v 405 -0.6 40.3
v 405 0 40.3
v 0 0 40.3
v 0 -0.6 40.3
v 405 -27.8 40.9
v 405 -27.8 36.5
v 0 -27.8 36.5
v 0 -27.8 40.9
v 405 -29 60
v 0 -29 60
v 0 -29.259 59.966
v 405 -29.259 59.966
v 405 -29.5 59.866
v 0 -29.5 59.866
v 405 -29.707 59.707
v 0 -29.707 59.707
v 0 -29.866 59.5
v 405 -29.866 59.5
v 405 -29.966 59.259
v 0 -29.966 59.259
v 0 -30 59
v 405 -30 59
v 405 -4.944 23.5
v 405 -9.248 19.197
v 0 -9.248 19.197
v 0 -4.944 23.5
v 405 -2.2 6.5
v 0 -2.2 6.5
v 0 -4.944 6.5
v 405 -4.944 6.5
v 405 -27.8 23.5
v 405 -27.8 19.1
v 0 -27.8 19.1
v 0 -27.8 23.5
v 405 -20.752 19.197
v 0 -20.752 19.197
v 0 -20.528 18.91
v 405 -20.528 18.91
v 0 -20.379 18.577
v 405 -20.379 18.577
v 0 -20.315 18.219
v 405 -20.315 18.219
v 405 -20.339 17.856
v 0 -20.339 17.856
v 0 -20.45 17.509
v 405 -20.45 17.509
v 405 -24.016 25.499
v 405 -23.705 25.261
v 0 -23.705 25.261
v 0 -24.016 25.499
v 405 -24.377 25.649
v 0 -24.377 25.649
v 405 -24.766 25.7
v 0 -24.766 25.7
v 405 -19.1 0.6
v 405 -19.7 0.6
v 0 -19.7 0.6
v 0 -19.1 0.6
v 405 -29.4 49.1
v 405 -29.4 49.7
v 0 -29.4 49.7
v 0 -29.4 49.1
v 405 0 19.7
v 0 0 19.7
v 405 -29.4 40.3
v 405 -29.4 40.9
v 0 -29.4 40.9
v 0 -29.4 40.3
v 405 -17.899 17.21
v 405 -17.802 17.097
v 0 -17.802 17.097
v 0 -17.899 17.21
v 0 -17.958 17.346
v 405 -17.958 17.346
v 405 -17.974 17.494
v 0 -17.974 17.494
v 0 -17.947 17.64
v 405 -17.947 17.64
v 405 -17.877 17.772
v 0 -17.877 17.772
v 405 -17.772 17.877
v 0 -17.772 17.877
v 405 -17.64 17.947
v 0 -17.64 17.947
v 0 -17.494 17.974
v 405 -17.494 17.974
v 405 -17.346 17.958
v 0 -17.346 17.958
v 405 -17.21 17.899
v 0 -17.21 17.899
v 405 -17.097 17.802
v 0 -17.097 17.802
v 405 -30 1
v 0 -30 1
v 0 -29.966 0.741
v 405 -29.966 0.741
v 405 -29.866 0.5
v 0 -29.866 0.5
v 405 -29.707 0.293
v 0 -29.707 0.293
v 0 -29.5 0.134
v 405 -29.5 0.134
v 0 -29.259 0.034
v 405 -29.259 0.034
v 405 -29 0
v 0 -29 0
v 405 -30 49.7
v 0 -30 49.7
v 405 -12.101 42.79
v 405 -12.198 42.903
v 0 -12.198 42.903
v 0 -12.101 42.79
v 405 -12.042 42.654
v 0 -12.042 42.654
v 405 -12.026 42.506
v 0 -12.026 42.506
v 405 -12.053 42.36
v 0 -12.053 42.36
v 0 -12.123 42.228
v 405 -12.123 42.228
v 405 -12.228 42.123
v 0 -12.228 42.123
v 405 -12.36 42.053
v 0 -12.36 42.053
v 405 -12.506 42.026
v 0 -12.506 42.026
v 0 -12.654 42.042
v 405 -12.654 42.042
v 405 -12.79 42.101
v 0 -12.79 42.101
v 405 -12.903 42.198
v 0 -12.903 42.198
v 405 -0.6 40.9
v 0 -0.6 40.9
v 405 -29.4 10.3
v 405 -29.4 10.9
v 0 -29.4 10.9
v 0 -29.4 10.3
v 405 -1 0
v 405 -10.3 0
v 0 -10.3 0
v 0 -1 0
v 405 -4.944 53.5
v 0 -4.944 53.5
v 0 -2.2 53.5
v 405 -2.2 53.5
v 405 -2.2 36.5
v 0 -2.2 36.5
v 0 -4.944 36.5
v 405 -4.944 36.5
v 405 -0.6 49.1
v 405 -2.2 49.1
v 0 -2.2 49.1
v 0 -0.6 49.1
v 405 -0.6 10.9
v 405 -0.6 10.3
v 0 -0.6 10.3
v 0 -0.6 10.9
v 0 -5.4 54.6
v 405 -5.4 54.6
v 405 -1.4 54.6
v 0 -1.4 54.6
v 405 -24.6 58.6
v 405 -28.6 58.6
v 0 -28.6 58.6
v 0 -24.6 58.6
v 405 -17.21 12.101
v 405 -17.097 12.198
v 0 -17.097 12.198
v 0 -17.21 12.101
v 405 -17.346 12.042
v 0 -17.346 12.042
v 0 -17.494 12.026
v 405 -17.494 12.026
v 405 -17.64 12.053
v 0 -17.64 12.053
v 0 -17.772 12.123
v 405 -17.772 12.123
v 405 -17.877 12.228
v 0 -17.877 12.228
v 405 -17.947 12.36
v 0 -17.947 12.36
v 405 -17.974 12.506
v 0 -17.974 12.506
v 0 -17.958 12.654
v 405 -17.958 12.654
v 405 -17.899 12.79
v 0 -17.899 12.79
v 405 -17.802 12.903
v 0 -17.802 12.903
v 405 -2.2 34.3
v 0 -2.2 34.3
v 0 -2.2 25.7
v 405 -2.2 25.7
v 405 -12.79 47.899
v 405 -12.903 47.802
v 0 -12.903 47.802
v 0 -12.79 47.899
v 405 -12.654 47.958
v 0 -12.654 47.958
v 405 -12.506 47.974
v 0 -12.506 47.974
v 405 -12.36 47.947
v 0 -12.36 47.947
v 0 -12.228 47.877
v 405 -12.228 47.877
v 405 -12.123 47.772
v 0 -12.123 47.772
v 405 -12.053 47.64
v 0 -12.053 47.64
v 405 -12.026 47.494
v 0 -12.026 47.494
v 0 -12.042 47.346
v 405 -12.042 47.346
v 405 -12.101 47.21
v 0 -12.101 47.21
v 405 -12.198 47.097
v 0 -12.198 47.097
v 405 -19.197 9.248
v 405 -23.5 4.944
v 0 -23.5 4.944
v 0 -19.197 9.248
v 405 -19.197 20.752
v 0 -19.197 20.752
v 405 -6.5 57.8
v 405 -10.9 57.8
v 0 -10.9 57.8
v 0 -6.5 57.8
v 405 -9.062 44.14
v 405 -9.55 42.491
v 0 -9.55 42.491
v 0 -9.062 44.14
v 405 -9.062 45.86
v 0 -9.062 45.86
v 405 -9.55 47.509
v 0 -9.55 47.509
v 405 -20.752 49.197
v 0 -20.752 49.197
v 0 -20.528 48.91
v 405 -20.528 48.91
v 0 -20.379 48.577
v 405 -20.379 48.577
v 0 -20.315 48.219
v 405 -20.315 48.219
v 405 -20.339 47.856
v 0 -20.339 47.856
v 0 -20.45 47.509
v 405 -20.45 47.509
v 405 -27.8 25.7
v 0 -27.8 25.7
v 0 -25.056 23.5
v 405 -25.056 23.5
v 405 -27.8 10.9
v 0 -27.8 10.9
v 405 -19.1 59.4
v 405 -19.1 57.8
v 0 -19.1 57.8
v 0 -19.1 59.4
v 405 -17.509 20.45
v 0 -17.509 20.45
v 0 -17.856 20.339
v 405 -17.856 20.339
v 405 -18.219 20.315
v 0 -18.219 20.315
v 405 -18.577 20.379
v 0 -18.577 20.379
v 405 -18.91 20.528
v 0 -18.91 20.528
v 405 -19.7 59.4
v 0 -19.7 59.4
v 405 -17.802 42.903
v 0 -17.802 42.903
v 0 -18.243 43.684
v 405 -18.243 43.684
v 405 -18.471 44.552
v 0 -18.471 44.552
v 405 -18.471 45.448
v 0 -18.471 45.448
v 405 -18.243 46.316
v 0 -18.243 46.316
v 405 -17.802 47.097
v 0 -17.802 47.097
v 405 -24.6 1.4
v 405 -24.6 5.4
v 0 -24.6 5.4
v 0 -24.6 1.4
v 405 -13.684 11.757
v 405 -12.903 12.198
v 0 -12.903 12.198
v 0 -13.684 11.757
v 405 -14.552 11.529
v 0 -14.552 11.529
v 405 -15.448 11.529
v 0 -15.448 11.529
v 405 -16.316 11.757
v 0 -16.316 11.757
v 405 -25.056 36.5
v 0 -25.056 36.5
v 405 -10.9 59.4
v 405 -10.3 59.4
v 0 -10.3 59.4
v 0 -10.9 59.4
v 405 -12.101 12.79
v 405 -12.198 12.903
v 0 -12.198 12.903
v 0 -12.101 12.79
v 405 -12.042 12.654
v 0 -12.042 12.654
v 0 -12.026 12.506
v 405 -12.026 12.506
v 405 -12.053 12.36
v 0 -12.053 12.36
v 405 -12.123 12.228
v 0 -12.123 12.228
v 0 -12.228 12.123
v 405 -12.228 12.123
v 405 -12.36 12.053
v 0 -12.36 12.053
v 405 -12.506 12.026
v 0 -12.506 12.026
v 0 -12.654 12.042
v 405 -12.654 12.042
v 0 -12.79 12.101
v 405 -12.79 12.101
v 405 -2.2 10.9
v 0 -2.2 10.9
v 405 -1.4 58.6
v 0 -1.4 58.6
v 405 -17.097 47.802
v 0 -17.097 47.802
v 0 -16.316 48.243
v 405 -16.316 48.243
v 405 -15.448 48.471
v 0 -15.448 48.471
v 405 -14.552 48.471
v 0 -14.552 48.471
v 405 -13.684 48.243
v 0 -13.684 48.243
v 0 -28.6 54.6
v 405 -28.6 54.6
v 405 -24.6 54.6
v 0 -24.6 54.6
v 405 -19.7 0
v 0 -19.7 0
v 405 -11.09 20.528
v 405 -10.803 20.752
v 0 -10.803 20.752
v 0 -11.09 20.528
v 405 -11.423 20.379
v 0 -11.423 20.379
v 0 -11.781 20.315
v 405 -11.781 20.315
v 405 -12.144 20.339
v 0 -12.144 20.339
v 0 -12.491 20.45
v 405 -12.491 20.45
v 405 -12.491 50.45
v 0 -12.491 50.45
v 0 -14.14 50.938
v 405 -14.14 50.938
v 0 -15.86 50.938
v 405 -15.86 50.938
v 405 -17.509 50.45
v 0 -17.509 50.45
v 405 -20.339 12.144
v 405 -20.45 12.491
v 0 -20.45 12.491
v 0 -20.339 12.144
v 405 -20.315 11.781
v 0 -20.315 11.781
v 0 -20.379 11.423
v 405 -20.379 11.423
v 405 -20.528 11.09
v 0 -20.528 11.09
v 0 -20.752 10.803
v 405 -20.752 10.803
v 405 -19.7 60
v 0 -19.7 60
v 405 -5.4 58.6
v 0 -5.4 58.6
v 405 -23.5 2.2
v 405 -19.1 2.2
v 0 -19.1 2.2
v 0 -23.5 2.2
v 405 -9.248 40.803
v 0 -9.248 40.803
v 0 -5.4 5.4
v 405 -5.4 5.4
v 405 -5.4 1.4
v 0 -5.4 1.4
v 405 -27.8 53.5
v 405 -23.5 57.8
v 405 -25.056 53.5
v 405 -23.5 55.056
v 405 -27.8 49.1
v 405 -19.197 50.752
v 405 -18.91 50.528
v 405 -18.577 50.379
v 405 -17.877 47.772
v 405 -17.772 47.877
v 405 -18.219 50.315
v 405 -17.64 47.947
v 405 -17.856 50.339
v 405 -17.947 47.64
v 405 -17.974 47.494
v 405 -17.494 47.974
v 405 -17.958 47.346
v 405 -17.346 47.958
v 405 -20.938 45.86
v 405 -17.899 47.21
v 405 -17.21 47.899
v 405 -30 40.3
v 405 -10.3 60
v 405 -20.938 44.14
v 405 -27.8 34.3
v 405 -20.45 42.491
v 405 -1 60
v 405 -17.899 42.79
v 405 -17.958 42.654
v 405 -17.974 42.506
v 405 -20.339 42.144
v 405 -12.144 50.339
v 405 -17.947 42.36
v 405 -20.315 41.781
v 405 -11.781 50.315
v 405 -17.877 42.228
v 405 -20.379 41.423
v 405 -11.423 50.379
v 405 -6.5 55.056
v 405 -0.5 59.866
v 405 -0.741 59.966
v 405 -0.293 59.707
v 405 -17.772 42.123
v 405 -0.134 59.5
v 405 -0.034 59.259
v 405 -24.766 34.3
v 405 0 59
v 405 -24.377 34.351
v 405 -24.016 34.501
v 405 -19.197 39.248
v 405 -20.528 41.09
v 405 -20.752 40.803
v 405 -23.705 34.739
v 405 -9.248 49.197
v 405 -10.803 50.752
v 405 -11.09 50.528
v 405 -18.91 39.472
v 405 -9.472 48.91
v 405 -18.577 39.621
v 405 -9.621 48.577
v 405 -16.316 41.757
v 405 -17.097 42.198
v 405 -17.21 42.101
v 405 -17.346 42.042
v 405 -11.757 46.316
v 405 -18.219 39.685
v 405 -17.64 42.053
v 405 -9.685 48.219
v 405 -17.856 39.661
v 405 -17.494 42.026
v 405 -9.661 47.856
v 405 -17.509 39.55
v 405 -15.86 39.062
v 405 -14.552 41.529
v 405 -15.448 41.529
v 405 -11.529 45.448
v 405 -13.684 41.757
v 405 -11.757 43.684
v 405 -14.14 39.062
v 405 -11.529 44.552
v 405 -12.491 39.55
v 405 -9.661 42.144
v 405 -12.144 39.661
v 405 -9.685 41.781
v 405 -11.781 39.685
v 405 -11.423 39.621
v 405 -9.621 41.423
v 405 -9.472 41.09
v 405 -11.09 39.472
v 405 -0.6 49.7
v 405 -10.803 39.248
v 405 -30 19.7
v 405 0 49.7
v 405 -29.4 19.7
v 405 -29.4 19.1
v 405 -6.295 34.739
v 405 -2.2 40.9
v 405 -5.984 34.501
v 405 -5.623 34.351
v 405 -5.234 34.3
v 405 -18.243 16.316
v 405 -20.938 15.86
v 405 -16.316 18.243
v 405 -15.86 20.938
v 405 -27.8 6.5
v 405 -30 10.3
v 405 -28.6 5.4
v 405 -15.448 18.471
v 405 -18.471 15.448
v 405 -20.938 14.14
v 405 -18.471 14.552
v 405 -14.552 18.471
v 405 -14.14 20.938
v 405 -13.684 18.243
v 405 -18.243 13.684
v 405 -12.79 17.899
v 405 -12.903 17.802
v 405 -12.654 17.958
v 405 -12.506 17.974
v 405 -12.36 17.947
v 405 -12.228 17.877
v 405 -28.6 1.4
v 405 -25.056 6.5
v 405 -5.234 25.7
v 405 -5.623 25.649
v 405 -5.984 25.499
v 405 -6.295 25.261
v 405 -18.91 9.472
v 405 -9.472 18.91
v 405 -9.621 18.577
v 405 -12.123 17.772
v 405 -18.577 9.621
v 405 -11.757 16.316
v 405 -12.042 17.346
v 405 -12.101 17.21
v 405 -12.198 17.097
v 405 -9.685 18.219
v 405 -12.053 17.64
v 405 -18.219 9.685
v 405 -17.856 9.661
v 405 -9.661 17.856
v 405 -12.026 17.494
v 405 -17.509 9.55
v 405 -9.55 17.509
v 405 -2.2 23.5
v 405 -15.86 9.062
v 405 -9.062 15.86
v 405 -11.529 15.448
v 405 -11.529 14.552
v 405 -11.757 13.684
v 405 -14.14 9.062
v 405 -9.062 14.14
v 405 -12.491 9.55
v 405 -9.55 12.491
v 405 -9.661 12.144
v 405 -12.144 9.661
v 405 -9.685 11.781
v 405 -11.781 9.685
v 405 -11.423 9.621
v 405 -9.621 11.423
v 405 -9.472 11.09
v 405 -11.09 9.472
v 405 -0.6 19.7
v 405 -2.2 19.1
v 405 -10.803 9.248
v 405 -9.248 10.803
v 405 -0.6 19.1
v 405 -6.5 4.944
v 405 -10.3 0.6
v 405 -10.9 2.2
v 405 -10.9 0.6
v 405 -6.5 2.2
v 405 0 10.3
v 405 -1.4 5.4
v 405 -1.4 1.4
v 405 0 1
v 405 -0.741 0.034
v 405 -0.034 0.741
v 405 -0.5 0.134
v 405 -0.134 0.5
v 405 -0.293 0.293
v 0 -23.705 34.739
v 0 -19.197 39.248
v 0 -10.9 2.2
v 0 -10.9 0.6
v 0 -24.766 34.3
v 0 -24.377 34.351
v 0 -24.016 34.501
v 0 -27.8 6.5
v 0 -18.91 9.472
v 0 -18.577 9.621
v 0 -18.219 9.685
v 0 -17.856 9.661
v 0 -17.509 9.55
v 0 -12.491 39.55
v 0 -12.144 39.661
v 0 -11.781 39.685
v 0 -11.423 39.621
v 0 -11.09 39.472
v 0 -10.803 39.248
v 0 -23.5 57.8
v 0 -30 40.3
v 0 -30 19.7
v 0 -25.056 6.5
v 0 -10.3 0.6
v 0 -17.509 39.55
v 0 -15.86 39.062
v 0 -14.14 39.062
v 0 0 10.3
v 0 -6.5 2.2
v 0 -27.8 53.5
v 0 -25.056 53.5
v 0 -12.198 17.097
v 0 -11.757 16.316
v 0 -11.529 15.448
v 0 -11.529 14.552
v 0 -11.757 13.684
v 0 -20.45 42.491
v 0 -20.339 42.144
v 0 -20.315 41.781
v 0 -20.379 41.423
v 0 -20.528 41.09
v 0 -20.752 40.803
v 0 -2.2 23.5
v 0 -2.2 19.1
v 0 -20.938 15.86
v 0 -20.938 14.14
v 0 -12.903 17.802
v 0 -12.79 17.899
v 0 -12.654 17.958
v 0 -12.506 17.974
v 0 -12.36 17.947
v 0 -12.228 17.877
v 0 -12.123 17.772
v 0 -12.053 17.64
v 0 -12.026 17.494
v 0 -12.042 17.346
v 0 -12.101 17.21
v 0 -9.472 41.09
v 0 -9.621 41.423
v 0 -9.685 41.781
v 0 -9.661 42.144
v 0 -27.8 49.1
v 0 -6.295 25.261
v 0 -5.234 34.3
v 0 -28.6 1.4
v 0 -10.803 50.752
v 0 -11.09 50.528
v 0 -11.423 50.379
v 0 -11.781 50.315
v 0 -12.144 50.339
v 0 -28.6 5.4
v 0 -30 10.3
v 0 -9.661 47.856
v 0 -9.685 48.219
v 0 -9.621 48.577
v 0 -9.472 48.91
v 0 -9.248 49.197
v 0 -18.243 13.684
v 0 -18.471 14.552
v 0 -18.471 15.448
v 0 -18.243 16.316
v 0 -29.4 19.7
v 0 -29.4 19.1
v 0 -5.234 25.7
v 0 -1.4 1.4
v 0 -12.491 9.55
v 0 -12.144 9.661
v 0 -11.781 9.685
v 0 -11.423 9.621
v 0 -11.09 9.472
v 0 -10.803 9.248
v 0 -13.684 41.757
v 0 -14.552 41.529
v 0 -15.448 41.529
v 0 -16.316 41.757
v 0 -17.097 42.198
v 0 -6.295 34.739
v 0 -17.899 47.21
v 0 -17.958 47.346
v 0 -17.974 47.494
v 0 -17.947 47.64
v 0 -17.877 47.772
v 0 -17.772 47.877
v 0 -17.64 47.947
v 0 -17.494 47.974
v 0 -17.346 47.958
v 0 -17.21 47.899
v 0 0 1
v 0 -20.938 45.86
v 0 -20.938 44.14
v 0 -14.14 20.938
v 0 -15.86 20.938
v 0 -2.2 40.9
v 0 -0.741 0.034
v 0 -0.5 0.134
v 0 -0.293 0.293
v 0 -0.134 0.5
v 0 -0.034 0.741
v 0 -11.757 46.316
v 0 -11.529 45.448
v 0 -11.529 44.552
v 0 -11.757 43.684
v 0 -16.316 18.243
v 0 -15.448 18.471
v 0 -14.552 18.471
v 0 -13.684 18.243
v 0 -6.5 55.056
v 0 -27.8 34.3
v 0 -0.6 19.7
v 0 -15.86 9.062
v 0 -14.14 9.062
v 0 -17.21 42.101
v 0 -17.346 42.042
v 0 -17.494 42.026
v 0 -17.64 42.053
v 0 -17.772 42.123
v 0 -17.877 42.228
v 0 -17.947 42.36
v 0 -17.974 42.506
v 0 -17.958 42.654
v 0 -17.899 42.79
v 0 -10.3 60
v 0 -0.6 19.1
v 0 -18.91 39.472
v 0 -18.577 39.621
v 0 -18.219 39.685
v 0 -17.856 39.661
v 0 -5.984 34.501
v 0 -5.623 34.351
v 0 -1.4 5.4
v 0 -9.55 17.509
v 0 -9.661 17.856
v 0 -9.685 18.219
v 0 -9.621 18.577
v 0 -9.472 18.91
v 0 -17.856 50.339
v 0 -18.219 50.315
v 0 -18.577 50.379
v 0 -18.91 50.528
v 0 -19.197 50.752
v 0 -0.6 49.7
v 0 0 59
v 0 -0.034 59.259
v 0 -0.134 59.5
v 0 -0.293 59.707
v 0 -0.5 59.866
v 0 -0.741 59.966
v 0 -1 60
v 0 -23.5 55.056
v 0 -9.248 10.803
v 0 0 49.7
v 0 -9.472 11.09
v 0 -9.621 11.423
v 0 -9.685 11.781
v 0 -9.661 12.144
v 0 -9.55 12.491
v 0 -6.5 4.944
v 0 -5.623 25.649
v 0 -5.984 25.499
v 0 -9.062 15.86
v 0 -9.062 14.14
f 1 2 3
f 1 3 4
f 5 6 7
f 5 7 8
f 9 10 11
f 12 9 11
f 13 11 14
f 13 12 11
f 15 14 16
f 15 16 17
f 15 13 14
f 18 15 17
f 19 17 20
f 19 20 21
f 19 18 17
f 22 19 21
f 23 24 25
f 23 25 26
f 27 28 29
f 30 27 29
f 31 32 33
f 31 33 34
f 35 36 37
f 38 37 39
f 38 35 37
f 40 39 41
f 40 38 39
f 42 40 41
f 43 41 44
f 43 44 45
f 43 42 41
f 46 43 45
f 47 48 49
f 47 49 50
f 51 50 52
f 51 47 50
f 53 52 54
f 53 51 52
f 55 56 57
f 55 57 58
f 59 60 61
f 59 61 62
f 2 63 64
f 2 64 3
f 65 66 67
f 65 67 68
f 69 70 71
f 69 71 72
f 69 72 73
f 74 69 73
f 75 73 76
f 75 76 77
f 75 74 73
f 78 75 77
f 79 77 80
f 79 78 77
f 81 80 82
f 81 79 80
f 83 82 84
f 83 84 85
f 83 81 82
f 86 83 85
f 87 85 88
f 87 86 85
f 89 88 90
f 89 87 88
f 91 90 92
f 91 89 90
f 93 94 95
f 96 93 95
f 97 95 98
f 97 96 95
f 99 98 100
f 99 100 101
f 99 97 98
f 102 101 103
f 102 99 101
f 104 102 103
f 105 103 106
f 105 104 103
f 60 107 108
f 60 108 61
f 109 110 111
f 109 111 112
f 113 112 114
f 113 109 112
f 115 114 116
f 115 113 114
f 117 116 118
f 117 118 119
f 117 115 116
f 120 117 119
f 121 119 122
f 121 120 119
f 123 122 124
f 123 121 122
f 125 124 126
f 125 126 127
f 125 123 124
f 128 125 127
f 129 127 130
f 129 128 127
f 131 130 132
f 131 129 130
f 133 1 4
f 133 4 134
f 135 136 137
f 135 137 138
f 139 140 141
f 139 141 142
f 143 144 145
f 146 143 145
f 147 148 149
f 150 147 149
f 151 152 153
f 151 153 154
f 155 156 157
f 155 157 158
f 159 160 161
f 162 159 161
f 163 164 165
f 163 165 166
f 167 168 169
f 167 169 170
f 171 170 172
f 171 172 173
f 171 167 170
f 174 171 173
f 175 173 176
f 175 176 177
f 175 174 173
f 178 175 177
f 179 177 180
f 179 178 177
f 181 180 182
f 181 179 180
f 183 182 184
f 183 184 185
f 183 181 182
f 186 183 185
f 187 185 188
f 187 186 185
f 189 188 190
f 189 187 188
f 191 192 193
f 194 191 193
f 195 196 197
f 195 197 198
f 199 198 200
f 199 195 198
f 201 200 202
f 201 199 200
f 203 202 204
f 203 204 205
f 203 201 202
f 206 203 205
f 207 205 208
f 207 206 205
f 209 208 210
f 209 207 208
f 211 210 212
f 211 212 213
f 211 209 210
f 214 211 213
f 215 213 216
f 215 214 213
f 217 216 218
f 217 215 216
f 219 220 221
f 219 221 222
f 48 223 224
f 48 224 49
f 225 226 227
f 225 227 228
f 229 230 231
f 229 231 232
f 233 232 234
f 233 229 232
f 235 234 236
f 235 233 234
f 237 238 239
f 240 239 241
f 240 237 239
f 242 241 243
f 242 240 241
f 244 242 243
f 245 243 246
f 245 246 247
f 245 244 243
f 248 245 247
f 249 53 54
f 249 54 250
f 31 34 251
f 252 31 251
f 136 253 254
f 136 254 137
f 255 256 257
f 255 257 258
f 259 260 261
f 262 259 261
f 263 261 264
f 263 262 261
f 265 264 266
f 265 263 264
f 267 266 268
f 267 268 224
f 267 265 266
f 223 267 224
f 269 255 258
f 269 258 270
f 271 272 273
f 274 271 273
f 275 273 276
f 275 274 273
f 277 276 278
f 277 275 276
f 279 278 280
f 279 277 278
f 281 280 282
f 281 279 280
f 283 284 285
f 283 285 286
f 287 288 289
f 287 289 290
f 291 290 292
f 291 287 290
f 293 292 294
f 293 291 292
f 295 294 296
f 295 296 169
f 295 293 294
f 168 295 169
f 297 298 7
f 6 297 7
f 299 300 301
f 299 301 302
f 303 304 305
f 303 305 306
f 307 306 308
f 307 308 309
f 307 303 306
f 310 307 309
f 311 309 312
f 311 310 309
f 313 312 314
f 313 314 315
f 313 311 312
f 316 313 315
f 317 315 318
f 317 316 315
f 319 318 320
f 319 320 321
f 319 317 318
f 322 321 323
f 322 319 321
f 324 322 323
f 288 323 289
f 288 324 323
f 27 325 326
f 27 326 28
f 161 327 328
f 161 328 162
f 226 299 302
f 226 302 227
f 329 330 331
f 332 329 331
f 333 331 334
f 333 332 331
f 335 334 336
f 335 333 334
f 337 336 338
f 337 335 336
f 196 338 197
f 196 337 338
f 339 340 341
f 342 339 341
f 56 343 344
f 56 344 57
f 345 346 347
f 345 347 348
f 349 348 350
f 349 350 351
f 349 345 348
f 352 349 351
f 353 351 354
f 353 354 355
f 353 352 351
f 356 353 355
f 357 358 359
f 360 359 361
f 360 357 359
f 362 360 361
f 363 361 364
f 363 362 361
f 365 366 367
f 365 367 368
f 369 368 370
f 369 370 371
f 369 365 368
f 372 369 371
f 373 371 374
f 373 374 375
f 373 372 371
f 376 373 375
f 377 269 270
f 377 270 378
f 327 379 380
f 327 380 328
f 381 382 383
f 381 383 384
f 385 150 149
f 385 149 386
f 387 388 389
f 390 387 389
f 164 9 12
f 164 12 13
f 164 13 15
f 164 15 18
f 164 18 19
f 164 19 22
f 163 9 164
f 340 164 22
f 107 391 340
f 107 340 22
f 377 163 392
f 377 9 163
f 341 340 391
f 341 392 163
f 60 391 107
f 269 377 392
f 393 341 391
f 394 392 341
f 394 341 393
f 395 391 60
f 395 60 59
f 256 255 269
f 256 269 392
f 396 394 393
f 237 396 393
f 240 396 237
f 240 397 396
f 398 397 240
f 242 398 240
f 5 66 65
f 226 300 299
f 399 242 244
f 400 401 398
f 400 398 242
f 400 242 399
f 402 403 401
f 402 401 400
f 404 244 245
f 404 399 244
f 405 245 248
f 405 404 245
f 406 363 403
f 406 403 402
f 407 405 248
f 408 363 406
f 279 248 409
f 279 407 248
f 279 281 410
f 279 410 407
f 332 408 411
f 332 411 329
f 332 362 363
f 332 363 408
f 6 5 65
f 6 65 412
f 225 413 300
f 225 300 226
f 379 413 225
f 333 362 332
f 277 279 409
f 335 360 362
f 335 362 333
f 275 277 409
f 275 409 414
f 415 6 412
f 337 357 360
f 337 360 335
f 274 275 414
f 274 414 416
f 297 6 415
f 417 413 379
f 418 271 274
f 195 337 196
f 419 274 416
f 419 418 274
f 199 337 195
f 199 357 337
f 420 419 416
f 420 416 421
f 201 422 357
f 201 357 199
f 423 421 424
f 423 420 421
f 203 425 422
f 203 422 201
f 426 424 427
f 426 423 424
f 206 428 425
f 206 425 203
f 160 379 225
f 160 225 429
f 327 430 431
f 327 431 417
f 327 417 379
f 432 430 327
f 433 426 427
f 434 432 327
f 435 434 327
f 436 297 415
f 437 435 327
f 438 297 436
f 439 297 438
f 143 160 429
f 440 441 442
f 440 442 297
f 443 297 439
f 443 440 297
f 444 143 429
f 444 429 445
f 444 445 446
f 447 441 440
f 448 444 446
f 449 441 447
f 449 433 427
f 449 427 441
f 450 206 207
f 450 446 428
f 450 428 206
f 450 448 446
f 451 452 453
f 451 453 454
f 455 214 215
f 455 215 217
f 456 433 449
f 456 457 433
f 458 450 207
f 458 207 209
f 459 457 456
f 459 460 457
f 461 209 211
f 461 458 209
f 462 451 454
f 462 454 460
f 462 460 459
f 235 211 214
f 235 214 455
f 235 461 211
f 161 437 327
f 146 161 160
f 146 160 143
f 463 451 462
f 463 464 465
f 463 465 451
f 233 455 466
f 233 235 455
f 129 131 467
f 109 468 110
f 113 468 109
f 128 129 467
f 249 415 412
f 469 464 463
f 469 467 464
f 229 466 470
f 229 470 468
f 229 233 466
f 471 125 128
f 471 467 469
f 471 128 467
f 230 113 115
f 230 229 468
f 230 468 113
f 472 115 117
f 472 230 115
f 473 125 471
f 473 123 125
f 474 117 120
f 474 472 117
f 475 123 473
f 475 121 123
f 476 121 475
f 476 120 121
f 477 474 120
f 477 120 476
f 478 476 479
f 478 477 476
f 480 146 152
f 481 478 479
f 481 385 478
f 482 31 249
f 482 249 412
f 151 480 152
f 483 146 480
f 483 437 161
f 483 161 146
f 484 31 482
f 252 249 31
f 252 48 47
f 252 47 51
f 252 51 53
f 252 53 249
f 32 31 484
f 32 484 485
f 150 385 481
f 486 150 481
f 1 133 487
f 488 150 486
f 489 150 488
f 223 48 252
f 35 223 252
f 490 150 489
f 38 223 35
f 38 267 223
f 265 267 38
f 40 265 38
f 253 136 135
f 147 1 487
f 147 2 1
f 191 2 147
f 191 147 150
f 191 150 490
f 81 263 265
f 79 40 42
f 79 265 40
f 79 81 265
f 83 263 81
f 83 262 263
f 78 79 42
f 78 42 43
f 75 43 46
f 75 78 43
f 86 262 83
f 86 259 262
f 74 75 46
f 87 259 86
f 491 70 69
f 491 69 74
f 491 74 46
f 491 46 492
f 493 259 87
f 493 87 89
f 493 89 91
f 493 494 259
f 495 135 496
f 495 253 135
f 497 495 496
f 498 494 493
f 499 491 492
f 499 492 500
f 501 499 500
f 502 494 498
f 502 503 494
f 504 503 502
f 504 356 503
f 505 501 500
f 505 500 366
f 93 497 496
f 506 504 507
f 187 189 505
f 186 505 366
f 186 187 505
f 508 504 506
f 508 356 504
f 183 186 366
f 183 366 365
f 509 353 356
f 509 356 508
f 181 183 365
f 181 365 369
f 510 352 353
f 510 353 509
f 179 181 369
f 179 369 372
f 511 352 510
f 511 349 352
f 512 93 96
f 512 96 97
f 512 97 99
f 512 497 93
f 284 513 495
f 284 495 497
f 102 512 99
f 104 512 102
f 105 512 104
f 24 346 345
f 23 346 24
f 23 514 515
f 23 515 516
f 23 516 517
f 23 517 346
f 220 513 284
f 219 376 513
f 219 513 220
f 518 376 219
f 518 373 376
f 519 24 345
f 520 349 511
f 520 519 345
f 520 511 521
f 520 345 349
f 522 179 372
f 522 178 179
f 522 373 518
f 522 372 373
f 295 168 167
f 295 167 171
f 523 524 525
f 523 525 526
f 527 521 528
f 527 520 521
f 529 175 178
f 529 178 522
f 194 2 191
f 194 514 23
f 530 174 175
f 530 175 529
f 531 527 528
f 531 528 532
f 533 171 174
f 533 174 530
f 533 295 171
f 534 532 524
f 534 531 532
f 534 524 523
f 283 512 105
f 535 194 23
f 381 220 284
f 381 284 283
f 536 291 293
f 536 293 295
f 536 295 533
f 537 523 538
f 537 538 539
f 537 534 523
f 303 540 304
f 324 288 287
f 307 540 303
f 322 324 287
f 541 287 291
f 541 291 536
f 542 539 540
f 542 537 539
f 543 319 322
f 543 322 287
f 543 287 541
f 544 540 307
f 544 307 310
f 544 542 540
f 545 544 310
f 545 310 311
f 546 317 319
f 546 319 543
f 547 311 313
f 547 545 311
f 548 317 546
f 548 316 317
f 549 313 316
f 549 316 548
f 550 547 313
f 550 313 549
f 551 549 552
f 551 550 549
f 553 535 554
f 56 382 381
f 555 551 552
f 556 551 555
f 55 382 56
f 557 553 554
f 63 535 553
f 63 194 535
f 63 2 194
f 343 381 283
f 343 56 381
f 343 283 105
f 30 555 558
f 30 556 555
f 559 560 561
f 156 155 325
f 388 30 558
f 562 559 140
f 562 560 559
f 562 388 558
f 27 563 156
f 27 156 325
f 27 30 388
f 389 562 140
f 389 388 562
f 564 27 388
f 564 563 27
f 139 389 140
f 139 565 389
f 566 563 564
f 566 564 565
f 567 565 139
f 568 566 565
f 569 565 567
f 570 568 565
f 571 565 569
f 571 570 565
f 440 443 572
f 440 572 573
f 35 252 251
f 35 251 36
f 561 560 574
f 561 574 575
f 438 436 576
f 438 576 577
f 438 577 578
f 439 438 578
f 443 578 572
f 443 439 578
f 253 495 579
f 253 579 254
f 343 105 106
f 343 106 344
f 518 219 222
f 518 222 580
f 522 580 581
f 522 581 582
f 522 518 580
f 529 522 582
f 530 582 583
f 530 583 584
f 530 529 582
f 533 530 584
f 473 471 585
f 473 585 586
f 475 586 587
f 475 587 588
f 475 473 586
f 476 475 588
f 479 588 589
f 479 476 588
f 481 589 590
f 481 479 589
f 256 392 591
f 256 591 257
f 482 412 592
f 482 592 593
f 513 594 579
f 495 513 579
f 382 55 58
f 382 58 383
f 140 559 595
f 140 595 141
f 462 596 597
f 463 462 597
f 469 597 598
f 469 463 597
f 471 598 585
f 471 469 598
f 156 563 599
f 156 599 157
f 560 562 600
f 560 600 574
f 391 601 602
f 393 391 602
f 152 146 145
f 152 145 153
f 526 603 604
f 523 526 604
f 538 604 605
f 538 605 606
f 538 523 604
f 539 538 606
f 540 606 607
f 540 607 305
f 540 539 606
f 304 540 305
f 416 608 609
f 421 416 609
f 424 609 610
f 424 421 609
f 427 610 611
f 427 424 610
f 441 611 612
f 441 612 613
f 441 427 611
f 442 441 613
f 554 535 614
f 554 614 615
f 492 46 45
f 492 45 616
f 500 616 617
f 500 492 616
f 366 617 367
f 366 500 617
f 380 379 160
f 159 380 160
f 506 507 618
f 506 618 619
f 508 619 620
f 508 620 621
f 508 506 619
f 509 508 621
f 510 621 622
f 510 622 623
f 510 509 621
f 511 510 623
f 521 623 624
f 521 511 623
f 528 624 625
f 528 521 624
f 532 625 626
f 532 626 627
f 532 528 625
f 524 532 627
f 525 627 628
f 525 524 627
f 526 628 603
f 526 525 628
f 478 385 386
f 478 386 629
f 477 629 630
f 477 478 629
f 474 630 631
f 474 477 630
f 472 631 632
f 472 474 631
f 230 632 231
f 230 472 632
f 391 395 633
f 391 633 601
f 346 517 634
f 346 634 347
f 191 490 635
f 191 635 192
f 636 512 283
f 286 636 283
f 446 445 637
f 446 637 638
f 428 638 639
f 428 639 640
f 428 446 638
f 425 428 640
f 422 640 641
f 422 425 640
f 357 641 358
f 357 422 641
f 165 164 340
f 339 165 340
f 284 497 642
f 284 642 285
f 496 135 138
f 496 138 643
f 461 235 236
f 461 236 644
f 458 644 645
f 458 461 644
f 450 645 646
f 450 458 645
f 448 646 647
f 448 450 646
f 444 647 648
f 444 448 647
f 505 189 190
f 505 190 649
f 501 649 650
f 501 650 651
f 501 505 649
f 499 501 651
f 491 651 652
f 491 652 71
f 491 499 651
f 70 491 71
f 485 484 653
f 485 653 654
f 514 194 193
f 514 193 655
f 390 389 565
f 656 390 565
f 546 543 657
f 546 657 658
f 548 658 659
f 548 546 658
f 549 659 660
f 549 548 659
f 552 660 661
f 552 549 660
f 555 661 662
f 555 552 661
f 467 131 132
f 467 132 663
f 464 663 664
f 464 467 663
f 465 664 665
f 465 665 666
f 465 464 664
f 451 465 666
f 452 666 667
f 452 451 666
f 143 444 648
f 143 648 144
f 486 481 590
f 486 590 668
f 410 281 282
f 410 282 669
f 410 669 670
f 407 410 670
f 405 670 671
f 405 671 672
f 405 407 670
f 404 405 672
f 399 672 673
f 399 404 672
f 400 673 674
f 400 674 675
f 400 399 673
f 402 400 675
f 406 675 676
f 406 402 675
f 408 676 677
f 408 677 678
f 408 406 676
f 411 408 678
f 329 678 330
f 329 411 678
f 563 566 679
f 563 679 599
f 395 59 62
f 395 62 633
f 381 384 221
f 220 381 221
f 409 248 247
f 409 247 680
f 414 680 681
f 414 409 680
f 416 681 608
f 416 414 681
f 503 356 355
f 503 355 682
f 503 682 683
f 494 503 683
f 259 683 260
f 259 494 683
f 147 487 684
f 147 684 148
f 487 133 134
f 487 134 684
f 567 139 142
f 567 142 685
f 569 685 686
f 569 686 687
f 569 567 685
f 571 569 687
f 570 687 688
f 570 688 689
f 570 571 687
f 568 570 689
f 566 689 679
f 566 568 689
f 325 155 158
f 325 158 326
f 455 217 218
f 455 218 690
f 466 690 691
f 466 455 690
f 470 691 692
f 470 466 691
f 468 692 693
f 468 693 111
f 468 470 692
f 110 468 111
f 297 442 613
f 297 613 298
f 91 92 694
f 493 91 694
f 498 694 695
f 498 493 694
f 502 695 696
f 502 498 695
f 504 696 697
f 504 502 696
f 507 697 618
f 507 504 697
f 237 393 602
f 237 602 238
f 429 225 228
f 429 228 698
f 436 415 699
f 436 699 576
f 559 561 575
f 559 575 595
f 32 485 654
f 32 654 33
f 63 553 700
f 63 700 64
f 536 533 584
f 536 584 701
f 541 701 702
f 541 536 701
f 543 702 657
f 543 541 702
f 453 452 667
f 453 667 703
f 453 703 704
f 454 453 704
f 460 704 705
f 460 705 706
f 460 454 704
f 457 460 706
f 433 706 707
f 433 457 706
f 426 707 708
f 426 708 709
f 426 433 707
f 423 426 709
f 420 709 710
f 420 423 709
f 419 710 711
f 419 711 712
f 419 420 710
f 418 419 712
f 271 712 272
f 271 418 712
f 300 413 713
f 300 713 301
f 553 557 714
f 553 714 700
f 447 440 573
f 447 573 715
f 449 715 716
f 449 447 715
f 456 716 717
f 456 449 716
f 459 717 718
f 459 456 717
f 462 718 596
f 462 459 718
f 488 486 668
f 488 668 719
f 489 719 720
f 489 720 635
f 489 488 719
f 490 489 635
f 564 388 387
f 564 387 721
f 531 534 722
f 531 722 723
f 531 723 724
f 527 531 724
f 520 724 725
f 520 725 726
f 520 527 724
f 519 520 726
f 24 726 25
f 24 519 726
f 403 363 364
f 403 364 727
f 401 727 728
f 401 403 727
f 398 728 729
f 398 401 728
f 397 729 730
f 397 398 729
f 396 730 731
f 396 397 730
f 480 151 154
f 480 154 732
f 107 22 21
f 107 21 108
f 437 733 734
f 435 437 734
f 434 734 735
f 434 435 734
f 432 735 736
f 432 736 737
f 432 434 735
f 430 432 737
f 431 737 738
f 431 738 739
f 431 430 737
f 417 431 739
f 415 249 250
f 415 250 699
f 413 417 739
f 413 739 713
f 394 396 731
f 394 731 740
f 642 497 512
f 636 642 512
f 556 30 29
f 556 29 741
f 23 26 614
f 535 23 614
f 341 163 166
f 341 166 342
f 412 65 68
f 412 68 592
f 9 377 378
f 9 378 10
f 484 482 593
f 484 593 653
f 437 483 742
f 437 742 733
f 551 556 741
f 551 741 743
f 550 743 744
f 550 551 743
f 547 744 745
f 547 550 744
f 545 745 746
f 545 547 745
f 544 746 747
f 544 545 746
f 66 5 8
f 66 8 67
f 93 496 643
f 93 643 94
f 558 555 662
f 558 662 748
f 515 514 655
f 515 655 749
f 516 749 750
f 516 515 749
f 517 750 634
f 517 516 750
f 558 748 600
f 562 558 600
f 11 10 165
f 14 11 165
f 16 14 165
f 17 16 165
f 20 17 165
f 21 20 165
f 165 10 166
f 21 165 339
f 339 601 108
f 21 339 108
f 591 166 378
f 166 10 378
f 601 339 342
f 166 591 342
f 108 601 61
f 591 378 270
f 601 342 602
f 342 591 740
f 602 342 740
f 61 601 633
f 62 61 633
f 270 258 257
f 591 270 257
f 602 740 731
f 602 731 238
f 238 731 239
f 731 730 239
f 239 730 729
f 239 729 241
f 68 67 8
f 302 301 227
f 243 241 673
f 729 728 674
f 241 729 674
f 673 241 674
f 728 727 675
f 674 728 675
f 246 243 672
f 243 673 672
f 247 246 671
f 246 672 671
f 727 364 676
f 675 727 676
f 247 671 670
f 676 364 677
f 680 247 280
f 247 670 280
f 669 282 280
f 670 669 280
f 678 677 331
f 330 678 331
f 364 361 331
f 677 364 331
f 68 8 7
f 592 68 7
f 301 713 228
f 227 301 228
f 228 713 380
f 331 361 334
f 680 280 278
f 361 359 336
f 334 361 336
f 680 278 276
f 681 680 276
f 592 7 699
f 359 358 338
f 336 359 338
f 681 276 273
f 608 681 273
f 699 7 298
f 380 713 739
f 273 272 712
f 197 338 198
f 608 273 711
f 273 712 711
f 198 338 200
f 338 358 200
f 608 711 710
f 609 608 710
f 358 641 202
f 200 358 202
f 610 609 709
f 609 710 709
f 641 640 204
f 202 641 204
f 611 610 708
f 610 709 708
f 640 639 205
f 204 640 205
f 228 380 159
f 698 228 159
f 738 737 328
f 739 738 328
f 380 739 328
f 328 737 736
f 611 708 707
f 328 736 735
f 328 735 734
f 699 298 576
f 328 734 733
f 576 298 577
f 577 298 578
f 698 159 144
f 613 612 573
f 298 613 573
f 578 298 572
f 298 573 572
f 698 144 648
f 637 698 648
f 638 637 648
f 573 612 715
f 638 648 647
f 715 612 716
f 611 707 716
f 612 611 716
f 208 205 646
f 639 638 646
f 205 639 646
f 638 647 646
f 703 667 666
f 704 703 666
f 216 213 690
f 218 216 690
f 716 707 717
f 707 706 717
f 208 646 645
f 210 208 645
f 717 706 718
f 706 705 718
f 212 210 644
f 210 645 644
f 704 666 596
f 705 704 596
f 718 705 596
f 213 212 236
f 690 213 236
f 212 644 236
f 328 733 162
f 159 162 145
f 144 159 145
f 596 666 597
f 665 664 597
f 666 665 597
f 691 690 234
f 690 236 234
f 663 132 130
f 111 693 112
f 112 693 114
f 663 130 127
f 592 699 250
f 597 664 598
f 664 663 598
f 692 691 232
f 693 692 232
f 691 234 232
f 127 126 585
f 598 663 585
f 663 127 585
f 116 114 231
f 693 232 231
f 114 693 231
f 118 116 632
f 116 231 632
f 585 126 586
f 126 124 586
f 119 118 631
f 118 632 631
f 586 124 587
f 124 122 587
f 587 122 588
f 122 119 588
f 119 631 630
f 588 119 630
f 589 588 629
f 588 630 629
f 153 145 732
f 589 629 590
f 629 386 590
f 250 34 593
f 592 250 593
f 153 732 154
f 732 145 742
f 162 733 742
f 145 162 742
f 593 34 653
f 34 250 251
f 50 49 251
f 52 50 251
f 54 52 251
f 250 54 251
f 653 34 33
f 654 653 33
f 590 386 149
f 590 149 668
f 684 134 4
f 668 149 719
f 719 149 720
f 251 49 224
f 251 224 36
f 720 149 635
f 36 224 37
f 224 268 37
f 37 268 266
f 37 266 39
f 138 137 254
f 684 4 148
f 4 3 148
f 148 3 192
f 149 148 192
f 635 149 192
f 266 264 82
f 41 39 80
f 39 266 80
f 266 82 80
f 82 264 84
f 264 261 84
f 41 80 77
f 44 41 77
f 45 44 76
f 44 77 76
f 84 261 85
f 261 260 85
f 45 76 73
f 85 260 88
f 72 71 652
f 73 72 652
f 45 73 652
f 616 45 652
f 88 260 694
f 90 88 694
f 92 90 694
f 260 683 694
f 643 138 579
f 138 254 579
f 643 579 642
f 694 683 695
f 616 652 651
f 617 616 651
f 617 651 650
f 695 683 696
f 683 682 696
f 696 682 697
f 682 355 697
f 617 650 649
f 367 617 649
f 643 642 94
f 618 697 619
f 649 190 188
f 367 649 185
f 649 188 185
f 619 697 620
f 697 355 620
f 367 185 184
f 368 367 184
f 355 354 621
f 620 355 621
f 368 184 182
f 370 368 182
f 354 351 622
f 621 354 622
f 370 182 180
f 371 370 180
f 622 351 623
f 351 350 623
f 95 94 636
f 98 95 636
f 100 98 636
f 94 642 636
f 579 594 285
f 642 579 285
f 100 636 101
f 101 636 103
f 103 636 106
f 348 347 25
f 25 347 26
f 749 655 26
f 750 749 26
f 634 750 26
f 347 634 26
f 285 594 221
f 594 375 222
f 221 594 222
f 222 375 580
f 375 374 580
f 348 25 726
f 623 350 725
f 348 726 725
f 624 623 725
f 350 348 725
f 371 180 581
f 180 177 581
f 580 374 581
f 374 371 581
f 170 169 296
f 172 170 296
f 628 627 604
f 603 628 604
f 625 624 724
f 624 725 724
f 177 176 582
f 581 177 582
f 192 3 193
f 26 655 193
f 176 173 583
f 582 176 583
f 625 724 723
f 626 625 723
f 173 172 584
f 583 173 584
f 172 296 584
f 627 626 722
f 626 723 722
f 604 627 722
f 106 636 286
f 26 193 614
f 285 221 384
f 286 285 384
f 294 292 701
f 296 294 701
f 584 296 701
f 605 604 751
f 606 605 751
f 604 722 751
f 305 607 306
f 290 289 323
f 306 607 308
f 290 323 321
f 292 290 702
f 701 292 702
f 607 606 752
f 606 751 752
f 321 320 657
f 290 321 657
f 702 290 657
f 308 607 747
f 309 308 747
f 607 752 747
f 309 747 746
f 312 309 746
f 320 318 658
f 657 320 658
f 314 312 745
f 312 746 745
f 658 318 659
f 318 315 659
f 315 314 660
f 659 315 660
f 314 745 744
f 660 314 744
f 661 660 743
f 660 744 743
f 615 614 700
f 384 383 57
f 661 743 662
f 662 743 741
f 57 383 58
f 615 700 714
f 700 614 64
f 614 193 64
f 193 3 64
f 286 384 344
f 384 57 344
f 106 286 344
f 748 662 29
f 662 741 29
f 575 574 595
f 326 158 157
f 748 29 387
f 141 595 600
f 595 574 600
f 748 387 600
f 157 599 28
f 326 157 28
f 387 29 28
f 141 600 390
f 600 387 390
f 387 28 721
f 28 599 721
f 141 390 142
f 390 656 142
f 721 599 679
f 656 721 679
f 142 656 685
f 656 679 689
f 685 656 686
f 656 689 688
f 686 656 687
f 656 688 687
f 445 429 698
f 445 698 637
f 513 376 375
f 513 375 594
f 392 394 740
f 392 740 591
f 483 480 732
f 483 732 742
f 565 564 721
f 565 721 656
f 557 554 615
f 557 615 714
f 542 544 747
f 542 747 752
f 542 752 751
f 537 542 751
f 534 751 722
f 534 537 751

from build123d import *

# Parameters (mm, degrees)
SKETCH1_W           = 4
SKETCH1_H           = 4
BOSS_EXTRUDE1_DEPTH = 405


with BuildPart() as part:
    # Sketch1 → Boss-Extrude1 (new body)
    with BuildSketch(Plane(origin=(405, 0, 0), x_dir=(0, 0, -1), z_dir=(1, 0, 0))):
        with BuildLine():
            Line((-10.803382818, -20.752252101), (-6.5, -25.055634919))
            Line((-6.5, -25.055634919), (-6.5, -27.8))
            Line((-6.5, -27.8), (-10.9, -27.8))
            Line((-10.9, -27.8), (-10.9, -29.4))
            Line((-10.9, -29.4), (-10.3, -29.4))
            Line((-10.3, -29.4), (-10.3, -30))
            Line((-10.3, -30), (-1, -30))
            ThreePointArc((-1, -30), (-0.292893219, -29.707106781), (0, -29))
            Line((0, -29), (0, -19.7))
            Line((0, -19.7), (-0.6, -19.7))
            Line((-0.6, -19.7), (-0.6, -19.1))
            Line((-0.6, -19.1), (-2.2, -19.1))
            Line((-2.2, -19.1), (-2.2, -23.5))
            Line((-2.2, -23.5), (-4.944365081, -23.5))
            Line((-4.944365081, -23.5), (-9.247747899, -19.196617182))
            ThreePointArc((-9.247747899, -19.196617182), (-9.66365027, -18.400083987), (-9.549670182, -17.508765608))
            ThreePointArc((-9.549670182, -17.508765608), (-9, -15), (-9.549670182, -12.491234392))
            ThreePointArc((-9.549670182, -12.491234392), (-9.66365027, -11.599916013), (-9.247747899, -10.803382818))
            Line((-9.247747899, -10.803382818), (-4.944365081, -6.5))
            Line((-4.944365081, -6.5), (-2.2, -6.5))
            Line((-2.2, -6.5), (-2.2, -10.9))
            Line((-2.2, -10.9), (-0.6, -10.9))
            Line((-0.6, -10.9), (-0.6, -10.3))
            Line((-0.6, -10.3), (0, -10.3))
            Line((0, -10.3), (0, -1))
            ThreePointArc((0, -1), (-0.292893219, -0.292893219), (-1, 0))
            Line((-1, 0), (-10.3, 0))
            Line((-10.3, 0), (-10.3, -0.6))
            Line((-10.3, -0.6), (-10.9, -0.6))
            Line((-10.9, -0.6), (-10.9, -2.2))
            Line((-10.9, -2.2), (-6.5, -2.2))
            Line((-6.5, -2.2), (-6.5, -4.944365081))
            Line((-6.5, -4.944365081), (-10.803382818, -9.247747899))
            ThreePointArc((-10.803382818, -9.247747899), (-11.599916013, -9.66365027), (-12.491234392, -9.549670182))
            ThreePointArc((-12.491234392, -9.549670182), (-15, -9), (-17.508765608, -9.549670182))
            ThreePointArc((-17.508765608, -9.549670182), (-18.400083987, -9.66365027), (-19.196617182, -9.247747899))
            Line((-19.196617182, -9.247747899), (-23.5, -4.944365081))
            Line((-23.5, -4.944365081), (-23.5, -2.2))
            Line((-23.5, -2.2), (-19.1, -2.2))
            Line((-19.1, -2.2), (-19.1, -0.6))
            Line((-19.1, -0.6), (-19.7, -0.6))
            Line((-19.7, -0.6), (-19.7, 0))
            Line((-19.7, 0), (-40.3, 0))
            Line((-40.3, 0), (-40.3, -0.6))
            Line((-40.3, -0.6), (-40.9, -0.6))
            Line((-40.9, -0.6), (-40.9, -2.2))
            Line((-40.9, -2.2), (-36.5, -2.2))
            Line((-36.5, -2.2), (-36.5, -4.944365081))
            Line((-36.5, -4.944365081), (-40.803382818, -9.247747899))
            ThreePointArc((-40.803382818, -9.247747899), (-41.599916013, -9.66365027), (-42.491234392, -9.549670182))
            ThreePointArc((-42.491234392, -9.549670182), (-45, -9), (-47.508765608, -9.549670182))
            ThreePointArc((-47.508765608, -9.549670182), (-48.400083987, -9.66365027), (-49.196617182, -9.247747899))
            Line((-49.196617182, -9.247747899), (-53.5, -4.944365081))
            Line((-53.5, -4.944365081), (-53.5, -2.2))
            Line((-53.5, -2.2), (-49.1, -2.2))
            Line((-49.1, -2.2), (-49.1, -0.6))
            Line((-49.1, -0.6), (-49.7, -0.6))
            Line((-49.7, -0.6), (-49.7, 0))
            Line((-49.7, 0), (-59, 0))
            ThreePointArc((-59, 0), (-59.707106781, -0.292893219), (-60, -1))
            Line((-60, -1), (-60, -10.3))
            Line((-60, -10.3), (-59.4, -10.3))
            Line((-59.4, -10.3), (-59.4, -10.9))
            Line((-59.4, -10.9), (-57.8, -10.9))
            Line((-57.8, -10.9), (-57.8, -6.5))
            Line((-57.8, -6.5), (-55.055634919, -6.5))
            Line((-55.055634919, -6.5), (-50.752252101, -10.803382818))
            ThreePointArc((-50.752252101, -10.803382818), (-50.33634973, -11.599916013), (-50.450329818, -12.491234392))
            ThreePointArc((-50.450329818, -12.491234392), (-51, -15), (-50.450329818, -17.508765608))
            ThreePointArc((-50.450329818, -17.508765608), (-50.33634973, -18.400083987), (-50.752252101, -19.196617182))
            Line((-50.752252101, -19.196617182), (-55.055634919, -23.5))
            Line((-55.055634919, -23.5), (-57.8, -23.5))
            Line((-57.8, -23.5), (-57.8, -19.1))
            Line((-57.8, -19.1), (-59.4, -19.1))
            Line((-59.4, -19.1), (-59.4, -19.7))
            Line((-59.4, -19.7), (-60, -19.7))
            Line((-60, -19.7), (-60, -29))
            ThreePointArc((-60, -29), (-59.707106781, -29.707106781), (-59, -30))
            Line((-59, -30), (-49.7, -30))
            Line((-49.7, -30), (-49.7, -29.4))
            Line((-49.7, -29.4), (-49.1, -29.4))
            Line((-49.1, -29.4), (-49.1, -27.8))
            Line((-49.1, -27.8), (-53.5, -27.8))
            Line((-53.5, -27.8), (-53.5, -25.055634919))
            Line((-53.5, -25.055634919), (-49.196617182, -20.752252101))
            ThreePointArc((-49.196617182, -20.752252101), (-48.400083987, -20.33634973), (-47.508765608, -20.450329818))
            ThreePointArc((-47.508765608, -20.450329818), (-45, -21), (-42.491234392, -20.450329818))
            ThreePointArc((-42.491234392, -20.450329818), (-41.599916013, -20.33634973), (-40.803382818, -20.752252101))
            Line((-40.803382818, -20.752252101), (-36.5, -25.055634919))
            Line((-36.5, -25.055634919), (-36.5, -27.8))
            Line((-36.5, -27.8), (-40.9, -27.8))
            Line((-40.9, -27.8), (-40.9, -29.4))
            Line((-40.9, -29.4), (-40.3, -29.4))
            Line((-40.3, -29.4), (-40.3, -30))
            Line((-40.3, -30), (-19.7, -30))
            Line((-19.7, -30), (-19.7, -29.4))
            Line((-19.7, -29.4), (-19.1, -29.4))
            Line((-19.1, -29.4), (-19.1, -27.8))
            Line((-19.1, -27.8), (-23.5, -27.8))
            Line((-23.5, -27.8), (-23.5, -25.055634919))
            Line((-23.5, -25.055634919), (-19.196617182, -20.752252101))
            ThreePointArc((-19.196617182, -20.752252101), (-18.400083987, -20.33634973), (-17.508765608, -20.450329818))
            ThreePointArc((-17.508765608, -20.450329818), (-15, -21), (-12.491234392, -20.450329818))
            ThreePointArc((-12.491234392, -20.450329818), (-11.599916013, -20.33634973), (-10.803382818, -20.752252101))
        make_face()
        with Locations((-56.6, -26.6)):
            Rectangle(SKETCH1_W, SKETCH1_H, mode=Mode.SUBTRACT)
        with Locations((-56.6, -3.4)):
            Rectangle(SKETCH1_W, SKETCH1_H, mode=Mode.SUBTRACT)
        with Locations((-3.4, -26.6)):
            Rectangle(SKETCH1_W, SKETCH1_H, mode=Mode.SUBTRACT)
        with Locations((-3.4, -3.4)):
            Rectangle(SKETCH1_W, SKETCH1_H, mode=Mode.SUBTRACT)
        with BuildLine():
            Line((-39.247747899, -10.803382818), (-34.739339828, -6.294974747))
            ThreePointArc((-34.739339828, -6.294974747), (-34.414180701, -5.808339724), (-34.3, -5.234314575))
            Line((-34.3, -5.234314575), (-34.3, -2.2))
            Line((-34.3, -2.2), (-25.7, -2.2))
            Line((-25.7, -2.2), (-25.7, -5.234314575))
            ThreePointArc((-25.7, -5.234314575), (-25.585819299, -5.808339724), (-25.260660172, -6.294974747))
            Line((-25.260660172, -6.294974747), (-20.752252101, -10.803382818))
            ThreePointArc((-20.752252101, -10.803382818), (-20.33634973, -11.599916013), (-20.450329818, -12.491234392))
            ThreePointArc((-20.450329818, -12.491234392), (-21, -15), (-20.450329818, -17.508765608))
            ThreePointArc((-20.450329818, -17.508765608), (-20.33634973, -18.400083987), (-20.752252101, -19.196617182))
            Line((-20.752252101, -19.196617182), (-25.260660172, -23.705025253))
            ThreePointArc((-25.260660172, -23.705025253), (-25.585819299, -24.191660276), (-25.7, -24.765685425))
            Line((-25.7, -24.765685425), (-25.7, -27.8))
            Line((-25.7, -27.8), (-34.3, -27.8))
            Line((-34.3, -27.8), (-34.3, -24.765685425))
            ThreePointArc((-34.3, -24.765685425), (-34.414180701, -24.191660276), (-34.739339828, -23.705025253))
            Line((-34.739339828, -23.705025253), (-39.247747899, -19.196617182))
            ThreePointArc((-39.247747899, -19.196617182), (-39.66365027, -18.400083987), (-39.549670182, -17.508765608))
            ThreePointArc((-39.549670182, -17.508765608), (-39, -15), (-39.549670182, -12.491234392))
            ThreePointArc((-39.549670182, -12.491234392), (-39.66365027, -11.599916013), (-39.247747899, -10.803382818))
        make_face(mode=Mode.SUBTRACT)
        with BuildLine():
            ThreePointArc((-47.802270236, -17.096969605), (-48.5, -15), (-47.802270236, -12.903030395))
            ThreePointArc((-47.802270236, -12.903030395), (-47.828427125, -12.171572875), (-47.096969605, -12.197729764))
            ThreePointArc((-47.096969605, -12.197729764), (-45, -11.5), (-42.903030395, -12.197729764))
            ThreePointArc((-42.903030395, -12.197729764), (-42.171572875, -12.171572875), (-42.197729764, -12.903030395))
            ThreePointArc((-42.197729764, -12.903030395), (-41.5, -15), (-42.197729764, -17.096969605))
            ThreePointArc((-42.197729764, -17.096969605), (-42.171572875, -17.828427125), (-42.903030395, -17.802270236))
            ThreePointArc((-42.903030395, -17.802270236), (-45, -18.5), (-47.096969605, -17.802270236))
            ThreePointArc((-47.096969605, -17.802270236), (-47.828427125, -17.828427125), (-47.802270236, -17.096969605))
        make_face(mode=Mode.SUBTRACT)
        with BuildLine():
            ThreePointArc((-12.197729764, -12.903030395), (-11.5, -15), (-12.197729764, -17.096969605))
            ThreePointArc((-12.197729764, -17.096969605), (-12.171572875, -17.828427125), (-12.903030395, -17.802270236))
            ThreePointArc((-12.903030395, -17.802270236), (-15, -18.5), (-17.096969605, -17.802270236))
            ThreePointArc((-17.096969605, -17.802270236), (-17.828427125, -17.828427125), (-17.802270236, -17.096969605))
            ThreePointArc((-17.802270236, -17.096969605), (-18.5, -15), (-17.802270236, -12.903030395))
            ThreePointArc((-17.802270236, -12.903030395), (-17.828427125, -12.171572875), (-17.096969605, -12.197729764))
            ThreePointArc((-17.096969605, -12.197729764), (-15, -11.5), (-12.903030395, -12.197729764))
            ThreePointArc((-12.903030395, -12.197729764), (-12.171572875, -12.171572875), (-12.197729764, -12.903030395))
        make_face(mode=Mode.SUBTRACT)
    extrude(amount=-BOSS_EXTRUDE1_DEPTH)


solid = part.part
